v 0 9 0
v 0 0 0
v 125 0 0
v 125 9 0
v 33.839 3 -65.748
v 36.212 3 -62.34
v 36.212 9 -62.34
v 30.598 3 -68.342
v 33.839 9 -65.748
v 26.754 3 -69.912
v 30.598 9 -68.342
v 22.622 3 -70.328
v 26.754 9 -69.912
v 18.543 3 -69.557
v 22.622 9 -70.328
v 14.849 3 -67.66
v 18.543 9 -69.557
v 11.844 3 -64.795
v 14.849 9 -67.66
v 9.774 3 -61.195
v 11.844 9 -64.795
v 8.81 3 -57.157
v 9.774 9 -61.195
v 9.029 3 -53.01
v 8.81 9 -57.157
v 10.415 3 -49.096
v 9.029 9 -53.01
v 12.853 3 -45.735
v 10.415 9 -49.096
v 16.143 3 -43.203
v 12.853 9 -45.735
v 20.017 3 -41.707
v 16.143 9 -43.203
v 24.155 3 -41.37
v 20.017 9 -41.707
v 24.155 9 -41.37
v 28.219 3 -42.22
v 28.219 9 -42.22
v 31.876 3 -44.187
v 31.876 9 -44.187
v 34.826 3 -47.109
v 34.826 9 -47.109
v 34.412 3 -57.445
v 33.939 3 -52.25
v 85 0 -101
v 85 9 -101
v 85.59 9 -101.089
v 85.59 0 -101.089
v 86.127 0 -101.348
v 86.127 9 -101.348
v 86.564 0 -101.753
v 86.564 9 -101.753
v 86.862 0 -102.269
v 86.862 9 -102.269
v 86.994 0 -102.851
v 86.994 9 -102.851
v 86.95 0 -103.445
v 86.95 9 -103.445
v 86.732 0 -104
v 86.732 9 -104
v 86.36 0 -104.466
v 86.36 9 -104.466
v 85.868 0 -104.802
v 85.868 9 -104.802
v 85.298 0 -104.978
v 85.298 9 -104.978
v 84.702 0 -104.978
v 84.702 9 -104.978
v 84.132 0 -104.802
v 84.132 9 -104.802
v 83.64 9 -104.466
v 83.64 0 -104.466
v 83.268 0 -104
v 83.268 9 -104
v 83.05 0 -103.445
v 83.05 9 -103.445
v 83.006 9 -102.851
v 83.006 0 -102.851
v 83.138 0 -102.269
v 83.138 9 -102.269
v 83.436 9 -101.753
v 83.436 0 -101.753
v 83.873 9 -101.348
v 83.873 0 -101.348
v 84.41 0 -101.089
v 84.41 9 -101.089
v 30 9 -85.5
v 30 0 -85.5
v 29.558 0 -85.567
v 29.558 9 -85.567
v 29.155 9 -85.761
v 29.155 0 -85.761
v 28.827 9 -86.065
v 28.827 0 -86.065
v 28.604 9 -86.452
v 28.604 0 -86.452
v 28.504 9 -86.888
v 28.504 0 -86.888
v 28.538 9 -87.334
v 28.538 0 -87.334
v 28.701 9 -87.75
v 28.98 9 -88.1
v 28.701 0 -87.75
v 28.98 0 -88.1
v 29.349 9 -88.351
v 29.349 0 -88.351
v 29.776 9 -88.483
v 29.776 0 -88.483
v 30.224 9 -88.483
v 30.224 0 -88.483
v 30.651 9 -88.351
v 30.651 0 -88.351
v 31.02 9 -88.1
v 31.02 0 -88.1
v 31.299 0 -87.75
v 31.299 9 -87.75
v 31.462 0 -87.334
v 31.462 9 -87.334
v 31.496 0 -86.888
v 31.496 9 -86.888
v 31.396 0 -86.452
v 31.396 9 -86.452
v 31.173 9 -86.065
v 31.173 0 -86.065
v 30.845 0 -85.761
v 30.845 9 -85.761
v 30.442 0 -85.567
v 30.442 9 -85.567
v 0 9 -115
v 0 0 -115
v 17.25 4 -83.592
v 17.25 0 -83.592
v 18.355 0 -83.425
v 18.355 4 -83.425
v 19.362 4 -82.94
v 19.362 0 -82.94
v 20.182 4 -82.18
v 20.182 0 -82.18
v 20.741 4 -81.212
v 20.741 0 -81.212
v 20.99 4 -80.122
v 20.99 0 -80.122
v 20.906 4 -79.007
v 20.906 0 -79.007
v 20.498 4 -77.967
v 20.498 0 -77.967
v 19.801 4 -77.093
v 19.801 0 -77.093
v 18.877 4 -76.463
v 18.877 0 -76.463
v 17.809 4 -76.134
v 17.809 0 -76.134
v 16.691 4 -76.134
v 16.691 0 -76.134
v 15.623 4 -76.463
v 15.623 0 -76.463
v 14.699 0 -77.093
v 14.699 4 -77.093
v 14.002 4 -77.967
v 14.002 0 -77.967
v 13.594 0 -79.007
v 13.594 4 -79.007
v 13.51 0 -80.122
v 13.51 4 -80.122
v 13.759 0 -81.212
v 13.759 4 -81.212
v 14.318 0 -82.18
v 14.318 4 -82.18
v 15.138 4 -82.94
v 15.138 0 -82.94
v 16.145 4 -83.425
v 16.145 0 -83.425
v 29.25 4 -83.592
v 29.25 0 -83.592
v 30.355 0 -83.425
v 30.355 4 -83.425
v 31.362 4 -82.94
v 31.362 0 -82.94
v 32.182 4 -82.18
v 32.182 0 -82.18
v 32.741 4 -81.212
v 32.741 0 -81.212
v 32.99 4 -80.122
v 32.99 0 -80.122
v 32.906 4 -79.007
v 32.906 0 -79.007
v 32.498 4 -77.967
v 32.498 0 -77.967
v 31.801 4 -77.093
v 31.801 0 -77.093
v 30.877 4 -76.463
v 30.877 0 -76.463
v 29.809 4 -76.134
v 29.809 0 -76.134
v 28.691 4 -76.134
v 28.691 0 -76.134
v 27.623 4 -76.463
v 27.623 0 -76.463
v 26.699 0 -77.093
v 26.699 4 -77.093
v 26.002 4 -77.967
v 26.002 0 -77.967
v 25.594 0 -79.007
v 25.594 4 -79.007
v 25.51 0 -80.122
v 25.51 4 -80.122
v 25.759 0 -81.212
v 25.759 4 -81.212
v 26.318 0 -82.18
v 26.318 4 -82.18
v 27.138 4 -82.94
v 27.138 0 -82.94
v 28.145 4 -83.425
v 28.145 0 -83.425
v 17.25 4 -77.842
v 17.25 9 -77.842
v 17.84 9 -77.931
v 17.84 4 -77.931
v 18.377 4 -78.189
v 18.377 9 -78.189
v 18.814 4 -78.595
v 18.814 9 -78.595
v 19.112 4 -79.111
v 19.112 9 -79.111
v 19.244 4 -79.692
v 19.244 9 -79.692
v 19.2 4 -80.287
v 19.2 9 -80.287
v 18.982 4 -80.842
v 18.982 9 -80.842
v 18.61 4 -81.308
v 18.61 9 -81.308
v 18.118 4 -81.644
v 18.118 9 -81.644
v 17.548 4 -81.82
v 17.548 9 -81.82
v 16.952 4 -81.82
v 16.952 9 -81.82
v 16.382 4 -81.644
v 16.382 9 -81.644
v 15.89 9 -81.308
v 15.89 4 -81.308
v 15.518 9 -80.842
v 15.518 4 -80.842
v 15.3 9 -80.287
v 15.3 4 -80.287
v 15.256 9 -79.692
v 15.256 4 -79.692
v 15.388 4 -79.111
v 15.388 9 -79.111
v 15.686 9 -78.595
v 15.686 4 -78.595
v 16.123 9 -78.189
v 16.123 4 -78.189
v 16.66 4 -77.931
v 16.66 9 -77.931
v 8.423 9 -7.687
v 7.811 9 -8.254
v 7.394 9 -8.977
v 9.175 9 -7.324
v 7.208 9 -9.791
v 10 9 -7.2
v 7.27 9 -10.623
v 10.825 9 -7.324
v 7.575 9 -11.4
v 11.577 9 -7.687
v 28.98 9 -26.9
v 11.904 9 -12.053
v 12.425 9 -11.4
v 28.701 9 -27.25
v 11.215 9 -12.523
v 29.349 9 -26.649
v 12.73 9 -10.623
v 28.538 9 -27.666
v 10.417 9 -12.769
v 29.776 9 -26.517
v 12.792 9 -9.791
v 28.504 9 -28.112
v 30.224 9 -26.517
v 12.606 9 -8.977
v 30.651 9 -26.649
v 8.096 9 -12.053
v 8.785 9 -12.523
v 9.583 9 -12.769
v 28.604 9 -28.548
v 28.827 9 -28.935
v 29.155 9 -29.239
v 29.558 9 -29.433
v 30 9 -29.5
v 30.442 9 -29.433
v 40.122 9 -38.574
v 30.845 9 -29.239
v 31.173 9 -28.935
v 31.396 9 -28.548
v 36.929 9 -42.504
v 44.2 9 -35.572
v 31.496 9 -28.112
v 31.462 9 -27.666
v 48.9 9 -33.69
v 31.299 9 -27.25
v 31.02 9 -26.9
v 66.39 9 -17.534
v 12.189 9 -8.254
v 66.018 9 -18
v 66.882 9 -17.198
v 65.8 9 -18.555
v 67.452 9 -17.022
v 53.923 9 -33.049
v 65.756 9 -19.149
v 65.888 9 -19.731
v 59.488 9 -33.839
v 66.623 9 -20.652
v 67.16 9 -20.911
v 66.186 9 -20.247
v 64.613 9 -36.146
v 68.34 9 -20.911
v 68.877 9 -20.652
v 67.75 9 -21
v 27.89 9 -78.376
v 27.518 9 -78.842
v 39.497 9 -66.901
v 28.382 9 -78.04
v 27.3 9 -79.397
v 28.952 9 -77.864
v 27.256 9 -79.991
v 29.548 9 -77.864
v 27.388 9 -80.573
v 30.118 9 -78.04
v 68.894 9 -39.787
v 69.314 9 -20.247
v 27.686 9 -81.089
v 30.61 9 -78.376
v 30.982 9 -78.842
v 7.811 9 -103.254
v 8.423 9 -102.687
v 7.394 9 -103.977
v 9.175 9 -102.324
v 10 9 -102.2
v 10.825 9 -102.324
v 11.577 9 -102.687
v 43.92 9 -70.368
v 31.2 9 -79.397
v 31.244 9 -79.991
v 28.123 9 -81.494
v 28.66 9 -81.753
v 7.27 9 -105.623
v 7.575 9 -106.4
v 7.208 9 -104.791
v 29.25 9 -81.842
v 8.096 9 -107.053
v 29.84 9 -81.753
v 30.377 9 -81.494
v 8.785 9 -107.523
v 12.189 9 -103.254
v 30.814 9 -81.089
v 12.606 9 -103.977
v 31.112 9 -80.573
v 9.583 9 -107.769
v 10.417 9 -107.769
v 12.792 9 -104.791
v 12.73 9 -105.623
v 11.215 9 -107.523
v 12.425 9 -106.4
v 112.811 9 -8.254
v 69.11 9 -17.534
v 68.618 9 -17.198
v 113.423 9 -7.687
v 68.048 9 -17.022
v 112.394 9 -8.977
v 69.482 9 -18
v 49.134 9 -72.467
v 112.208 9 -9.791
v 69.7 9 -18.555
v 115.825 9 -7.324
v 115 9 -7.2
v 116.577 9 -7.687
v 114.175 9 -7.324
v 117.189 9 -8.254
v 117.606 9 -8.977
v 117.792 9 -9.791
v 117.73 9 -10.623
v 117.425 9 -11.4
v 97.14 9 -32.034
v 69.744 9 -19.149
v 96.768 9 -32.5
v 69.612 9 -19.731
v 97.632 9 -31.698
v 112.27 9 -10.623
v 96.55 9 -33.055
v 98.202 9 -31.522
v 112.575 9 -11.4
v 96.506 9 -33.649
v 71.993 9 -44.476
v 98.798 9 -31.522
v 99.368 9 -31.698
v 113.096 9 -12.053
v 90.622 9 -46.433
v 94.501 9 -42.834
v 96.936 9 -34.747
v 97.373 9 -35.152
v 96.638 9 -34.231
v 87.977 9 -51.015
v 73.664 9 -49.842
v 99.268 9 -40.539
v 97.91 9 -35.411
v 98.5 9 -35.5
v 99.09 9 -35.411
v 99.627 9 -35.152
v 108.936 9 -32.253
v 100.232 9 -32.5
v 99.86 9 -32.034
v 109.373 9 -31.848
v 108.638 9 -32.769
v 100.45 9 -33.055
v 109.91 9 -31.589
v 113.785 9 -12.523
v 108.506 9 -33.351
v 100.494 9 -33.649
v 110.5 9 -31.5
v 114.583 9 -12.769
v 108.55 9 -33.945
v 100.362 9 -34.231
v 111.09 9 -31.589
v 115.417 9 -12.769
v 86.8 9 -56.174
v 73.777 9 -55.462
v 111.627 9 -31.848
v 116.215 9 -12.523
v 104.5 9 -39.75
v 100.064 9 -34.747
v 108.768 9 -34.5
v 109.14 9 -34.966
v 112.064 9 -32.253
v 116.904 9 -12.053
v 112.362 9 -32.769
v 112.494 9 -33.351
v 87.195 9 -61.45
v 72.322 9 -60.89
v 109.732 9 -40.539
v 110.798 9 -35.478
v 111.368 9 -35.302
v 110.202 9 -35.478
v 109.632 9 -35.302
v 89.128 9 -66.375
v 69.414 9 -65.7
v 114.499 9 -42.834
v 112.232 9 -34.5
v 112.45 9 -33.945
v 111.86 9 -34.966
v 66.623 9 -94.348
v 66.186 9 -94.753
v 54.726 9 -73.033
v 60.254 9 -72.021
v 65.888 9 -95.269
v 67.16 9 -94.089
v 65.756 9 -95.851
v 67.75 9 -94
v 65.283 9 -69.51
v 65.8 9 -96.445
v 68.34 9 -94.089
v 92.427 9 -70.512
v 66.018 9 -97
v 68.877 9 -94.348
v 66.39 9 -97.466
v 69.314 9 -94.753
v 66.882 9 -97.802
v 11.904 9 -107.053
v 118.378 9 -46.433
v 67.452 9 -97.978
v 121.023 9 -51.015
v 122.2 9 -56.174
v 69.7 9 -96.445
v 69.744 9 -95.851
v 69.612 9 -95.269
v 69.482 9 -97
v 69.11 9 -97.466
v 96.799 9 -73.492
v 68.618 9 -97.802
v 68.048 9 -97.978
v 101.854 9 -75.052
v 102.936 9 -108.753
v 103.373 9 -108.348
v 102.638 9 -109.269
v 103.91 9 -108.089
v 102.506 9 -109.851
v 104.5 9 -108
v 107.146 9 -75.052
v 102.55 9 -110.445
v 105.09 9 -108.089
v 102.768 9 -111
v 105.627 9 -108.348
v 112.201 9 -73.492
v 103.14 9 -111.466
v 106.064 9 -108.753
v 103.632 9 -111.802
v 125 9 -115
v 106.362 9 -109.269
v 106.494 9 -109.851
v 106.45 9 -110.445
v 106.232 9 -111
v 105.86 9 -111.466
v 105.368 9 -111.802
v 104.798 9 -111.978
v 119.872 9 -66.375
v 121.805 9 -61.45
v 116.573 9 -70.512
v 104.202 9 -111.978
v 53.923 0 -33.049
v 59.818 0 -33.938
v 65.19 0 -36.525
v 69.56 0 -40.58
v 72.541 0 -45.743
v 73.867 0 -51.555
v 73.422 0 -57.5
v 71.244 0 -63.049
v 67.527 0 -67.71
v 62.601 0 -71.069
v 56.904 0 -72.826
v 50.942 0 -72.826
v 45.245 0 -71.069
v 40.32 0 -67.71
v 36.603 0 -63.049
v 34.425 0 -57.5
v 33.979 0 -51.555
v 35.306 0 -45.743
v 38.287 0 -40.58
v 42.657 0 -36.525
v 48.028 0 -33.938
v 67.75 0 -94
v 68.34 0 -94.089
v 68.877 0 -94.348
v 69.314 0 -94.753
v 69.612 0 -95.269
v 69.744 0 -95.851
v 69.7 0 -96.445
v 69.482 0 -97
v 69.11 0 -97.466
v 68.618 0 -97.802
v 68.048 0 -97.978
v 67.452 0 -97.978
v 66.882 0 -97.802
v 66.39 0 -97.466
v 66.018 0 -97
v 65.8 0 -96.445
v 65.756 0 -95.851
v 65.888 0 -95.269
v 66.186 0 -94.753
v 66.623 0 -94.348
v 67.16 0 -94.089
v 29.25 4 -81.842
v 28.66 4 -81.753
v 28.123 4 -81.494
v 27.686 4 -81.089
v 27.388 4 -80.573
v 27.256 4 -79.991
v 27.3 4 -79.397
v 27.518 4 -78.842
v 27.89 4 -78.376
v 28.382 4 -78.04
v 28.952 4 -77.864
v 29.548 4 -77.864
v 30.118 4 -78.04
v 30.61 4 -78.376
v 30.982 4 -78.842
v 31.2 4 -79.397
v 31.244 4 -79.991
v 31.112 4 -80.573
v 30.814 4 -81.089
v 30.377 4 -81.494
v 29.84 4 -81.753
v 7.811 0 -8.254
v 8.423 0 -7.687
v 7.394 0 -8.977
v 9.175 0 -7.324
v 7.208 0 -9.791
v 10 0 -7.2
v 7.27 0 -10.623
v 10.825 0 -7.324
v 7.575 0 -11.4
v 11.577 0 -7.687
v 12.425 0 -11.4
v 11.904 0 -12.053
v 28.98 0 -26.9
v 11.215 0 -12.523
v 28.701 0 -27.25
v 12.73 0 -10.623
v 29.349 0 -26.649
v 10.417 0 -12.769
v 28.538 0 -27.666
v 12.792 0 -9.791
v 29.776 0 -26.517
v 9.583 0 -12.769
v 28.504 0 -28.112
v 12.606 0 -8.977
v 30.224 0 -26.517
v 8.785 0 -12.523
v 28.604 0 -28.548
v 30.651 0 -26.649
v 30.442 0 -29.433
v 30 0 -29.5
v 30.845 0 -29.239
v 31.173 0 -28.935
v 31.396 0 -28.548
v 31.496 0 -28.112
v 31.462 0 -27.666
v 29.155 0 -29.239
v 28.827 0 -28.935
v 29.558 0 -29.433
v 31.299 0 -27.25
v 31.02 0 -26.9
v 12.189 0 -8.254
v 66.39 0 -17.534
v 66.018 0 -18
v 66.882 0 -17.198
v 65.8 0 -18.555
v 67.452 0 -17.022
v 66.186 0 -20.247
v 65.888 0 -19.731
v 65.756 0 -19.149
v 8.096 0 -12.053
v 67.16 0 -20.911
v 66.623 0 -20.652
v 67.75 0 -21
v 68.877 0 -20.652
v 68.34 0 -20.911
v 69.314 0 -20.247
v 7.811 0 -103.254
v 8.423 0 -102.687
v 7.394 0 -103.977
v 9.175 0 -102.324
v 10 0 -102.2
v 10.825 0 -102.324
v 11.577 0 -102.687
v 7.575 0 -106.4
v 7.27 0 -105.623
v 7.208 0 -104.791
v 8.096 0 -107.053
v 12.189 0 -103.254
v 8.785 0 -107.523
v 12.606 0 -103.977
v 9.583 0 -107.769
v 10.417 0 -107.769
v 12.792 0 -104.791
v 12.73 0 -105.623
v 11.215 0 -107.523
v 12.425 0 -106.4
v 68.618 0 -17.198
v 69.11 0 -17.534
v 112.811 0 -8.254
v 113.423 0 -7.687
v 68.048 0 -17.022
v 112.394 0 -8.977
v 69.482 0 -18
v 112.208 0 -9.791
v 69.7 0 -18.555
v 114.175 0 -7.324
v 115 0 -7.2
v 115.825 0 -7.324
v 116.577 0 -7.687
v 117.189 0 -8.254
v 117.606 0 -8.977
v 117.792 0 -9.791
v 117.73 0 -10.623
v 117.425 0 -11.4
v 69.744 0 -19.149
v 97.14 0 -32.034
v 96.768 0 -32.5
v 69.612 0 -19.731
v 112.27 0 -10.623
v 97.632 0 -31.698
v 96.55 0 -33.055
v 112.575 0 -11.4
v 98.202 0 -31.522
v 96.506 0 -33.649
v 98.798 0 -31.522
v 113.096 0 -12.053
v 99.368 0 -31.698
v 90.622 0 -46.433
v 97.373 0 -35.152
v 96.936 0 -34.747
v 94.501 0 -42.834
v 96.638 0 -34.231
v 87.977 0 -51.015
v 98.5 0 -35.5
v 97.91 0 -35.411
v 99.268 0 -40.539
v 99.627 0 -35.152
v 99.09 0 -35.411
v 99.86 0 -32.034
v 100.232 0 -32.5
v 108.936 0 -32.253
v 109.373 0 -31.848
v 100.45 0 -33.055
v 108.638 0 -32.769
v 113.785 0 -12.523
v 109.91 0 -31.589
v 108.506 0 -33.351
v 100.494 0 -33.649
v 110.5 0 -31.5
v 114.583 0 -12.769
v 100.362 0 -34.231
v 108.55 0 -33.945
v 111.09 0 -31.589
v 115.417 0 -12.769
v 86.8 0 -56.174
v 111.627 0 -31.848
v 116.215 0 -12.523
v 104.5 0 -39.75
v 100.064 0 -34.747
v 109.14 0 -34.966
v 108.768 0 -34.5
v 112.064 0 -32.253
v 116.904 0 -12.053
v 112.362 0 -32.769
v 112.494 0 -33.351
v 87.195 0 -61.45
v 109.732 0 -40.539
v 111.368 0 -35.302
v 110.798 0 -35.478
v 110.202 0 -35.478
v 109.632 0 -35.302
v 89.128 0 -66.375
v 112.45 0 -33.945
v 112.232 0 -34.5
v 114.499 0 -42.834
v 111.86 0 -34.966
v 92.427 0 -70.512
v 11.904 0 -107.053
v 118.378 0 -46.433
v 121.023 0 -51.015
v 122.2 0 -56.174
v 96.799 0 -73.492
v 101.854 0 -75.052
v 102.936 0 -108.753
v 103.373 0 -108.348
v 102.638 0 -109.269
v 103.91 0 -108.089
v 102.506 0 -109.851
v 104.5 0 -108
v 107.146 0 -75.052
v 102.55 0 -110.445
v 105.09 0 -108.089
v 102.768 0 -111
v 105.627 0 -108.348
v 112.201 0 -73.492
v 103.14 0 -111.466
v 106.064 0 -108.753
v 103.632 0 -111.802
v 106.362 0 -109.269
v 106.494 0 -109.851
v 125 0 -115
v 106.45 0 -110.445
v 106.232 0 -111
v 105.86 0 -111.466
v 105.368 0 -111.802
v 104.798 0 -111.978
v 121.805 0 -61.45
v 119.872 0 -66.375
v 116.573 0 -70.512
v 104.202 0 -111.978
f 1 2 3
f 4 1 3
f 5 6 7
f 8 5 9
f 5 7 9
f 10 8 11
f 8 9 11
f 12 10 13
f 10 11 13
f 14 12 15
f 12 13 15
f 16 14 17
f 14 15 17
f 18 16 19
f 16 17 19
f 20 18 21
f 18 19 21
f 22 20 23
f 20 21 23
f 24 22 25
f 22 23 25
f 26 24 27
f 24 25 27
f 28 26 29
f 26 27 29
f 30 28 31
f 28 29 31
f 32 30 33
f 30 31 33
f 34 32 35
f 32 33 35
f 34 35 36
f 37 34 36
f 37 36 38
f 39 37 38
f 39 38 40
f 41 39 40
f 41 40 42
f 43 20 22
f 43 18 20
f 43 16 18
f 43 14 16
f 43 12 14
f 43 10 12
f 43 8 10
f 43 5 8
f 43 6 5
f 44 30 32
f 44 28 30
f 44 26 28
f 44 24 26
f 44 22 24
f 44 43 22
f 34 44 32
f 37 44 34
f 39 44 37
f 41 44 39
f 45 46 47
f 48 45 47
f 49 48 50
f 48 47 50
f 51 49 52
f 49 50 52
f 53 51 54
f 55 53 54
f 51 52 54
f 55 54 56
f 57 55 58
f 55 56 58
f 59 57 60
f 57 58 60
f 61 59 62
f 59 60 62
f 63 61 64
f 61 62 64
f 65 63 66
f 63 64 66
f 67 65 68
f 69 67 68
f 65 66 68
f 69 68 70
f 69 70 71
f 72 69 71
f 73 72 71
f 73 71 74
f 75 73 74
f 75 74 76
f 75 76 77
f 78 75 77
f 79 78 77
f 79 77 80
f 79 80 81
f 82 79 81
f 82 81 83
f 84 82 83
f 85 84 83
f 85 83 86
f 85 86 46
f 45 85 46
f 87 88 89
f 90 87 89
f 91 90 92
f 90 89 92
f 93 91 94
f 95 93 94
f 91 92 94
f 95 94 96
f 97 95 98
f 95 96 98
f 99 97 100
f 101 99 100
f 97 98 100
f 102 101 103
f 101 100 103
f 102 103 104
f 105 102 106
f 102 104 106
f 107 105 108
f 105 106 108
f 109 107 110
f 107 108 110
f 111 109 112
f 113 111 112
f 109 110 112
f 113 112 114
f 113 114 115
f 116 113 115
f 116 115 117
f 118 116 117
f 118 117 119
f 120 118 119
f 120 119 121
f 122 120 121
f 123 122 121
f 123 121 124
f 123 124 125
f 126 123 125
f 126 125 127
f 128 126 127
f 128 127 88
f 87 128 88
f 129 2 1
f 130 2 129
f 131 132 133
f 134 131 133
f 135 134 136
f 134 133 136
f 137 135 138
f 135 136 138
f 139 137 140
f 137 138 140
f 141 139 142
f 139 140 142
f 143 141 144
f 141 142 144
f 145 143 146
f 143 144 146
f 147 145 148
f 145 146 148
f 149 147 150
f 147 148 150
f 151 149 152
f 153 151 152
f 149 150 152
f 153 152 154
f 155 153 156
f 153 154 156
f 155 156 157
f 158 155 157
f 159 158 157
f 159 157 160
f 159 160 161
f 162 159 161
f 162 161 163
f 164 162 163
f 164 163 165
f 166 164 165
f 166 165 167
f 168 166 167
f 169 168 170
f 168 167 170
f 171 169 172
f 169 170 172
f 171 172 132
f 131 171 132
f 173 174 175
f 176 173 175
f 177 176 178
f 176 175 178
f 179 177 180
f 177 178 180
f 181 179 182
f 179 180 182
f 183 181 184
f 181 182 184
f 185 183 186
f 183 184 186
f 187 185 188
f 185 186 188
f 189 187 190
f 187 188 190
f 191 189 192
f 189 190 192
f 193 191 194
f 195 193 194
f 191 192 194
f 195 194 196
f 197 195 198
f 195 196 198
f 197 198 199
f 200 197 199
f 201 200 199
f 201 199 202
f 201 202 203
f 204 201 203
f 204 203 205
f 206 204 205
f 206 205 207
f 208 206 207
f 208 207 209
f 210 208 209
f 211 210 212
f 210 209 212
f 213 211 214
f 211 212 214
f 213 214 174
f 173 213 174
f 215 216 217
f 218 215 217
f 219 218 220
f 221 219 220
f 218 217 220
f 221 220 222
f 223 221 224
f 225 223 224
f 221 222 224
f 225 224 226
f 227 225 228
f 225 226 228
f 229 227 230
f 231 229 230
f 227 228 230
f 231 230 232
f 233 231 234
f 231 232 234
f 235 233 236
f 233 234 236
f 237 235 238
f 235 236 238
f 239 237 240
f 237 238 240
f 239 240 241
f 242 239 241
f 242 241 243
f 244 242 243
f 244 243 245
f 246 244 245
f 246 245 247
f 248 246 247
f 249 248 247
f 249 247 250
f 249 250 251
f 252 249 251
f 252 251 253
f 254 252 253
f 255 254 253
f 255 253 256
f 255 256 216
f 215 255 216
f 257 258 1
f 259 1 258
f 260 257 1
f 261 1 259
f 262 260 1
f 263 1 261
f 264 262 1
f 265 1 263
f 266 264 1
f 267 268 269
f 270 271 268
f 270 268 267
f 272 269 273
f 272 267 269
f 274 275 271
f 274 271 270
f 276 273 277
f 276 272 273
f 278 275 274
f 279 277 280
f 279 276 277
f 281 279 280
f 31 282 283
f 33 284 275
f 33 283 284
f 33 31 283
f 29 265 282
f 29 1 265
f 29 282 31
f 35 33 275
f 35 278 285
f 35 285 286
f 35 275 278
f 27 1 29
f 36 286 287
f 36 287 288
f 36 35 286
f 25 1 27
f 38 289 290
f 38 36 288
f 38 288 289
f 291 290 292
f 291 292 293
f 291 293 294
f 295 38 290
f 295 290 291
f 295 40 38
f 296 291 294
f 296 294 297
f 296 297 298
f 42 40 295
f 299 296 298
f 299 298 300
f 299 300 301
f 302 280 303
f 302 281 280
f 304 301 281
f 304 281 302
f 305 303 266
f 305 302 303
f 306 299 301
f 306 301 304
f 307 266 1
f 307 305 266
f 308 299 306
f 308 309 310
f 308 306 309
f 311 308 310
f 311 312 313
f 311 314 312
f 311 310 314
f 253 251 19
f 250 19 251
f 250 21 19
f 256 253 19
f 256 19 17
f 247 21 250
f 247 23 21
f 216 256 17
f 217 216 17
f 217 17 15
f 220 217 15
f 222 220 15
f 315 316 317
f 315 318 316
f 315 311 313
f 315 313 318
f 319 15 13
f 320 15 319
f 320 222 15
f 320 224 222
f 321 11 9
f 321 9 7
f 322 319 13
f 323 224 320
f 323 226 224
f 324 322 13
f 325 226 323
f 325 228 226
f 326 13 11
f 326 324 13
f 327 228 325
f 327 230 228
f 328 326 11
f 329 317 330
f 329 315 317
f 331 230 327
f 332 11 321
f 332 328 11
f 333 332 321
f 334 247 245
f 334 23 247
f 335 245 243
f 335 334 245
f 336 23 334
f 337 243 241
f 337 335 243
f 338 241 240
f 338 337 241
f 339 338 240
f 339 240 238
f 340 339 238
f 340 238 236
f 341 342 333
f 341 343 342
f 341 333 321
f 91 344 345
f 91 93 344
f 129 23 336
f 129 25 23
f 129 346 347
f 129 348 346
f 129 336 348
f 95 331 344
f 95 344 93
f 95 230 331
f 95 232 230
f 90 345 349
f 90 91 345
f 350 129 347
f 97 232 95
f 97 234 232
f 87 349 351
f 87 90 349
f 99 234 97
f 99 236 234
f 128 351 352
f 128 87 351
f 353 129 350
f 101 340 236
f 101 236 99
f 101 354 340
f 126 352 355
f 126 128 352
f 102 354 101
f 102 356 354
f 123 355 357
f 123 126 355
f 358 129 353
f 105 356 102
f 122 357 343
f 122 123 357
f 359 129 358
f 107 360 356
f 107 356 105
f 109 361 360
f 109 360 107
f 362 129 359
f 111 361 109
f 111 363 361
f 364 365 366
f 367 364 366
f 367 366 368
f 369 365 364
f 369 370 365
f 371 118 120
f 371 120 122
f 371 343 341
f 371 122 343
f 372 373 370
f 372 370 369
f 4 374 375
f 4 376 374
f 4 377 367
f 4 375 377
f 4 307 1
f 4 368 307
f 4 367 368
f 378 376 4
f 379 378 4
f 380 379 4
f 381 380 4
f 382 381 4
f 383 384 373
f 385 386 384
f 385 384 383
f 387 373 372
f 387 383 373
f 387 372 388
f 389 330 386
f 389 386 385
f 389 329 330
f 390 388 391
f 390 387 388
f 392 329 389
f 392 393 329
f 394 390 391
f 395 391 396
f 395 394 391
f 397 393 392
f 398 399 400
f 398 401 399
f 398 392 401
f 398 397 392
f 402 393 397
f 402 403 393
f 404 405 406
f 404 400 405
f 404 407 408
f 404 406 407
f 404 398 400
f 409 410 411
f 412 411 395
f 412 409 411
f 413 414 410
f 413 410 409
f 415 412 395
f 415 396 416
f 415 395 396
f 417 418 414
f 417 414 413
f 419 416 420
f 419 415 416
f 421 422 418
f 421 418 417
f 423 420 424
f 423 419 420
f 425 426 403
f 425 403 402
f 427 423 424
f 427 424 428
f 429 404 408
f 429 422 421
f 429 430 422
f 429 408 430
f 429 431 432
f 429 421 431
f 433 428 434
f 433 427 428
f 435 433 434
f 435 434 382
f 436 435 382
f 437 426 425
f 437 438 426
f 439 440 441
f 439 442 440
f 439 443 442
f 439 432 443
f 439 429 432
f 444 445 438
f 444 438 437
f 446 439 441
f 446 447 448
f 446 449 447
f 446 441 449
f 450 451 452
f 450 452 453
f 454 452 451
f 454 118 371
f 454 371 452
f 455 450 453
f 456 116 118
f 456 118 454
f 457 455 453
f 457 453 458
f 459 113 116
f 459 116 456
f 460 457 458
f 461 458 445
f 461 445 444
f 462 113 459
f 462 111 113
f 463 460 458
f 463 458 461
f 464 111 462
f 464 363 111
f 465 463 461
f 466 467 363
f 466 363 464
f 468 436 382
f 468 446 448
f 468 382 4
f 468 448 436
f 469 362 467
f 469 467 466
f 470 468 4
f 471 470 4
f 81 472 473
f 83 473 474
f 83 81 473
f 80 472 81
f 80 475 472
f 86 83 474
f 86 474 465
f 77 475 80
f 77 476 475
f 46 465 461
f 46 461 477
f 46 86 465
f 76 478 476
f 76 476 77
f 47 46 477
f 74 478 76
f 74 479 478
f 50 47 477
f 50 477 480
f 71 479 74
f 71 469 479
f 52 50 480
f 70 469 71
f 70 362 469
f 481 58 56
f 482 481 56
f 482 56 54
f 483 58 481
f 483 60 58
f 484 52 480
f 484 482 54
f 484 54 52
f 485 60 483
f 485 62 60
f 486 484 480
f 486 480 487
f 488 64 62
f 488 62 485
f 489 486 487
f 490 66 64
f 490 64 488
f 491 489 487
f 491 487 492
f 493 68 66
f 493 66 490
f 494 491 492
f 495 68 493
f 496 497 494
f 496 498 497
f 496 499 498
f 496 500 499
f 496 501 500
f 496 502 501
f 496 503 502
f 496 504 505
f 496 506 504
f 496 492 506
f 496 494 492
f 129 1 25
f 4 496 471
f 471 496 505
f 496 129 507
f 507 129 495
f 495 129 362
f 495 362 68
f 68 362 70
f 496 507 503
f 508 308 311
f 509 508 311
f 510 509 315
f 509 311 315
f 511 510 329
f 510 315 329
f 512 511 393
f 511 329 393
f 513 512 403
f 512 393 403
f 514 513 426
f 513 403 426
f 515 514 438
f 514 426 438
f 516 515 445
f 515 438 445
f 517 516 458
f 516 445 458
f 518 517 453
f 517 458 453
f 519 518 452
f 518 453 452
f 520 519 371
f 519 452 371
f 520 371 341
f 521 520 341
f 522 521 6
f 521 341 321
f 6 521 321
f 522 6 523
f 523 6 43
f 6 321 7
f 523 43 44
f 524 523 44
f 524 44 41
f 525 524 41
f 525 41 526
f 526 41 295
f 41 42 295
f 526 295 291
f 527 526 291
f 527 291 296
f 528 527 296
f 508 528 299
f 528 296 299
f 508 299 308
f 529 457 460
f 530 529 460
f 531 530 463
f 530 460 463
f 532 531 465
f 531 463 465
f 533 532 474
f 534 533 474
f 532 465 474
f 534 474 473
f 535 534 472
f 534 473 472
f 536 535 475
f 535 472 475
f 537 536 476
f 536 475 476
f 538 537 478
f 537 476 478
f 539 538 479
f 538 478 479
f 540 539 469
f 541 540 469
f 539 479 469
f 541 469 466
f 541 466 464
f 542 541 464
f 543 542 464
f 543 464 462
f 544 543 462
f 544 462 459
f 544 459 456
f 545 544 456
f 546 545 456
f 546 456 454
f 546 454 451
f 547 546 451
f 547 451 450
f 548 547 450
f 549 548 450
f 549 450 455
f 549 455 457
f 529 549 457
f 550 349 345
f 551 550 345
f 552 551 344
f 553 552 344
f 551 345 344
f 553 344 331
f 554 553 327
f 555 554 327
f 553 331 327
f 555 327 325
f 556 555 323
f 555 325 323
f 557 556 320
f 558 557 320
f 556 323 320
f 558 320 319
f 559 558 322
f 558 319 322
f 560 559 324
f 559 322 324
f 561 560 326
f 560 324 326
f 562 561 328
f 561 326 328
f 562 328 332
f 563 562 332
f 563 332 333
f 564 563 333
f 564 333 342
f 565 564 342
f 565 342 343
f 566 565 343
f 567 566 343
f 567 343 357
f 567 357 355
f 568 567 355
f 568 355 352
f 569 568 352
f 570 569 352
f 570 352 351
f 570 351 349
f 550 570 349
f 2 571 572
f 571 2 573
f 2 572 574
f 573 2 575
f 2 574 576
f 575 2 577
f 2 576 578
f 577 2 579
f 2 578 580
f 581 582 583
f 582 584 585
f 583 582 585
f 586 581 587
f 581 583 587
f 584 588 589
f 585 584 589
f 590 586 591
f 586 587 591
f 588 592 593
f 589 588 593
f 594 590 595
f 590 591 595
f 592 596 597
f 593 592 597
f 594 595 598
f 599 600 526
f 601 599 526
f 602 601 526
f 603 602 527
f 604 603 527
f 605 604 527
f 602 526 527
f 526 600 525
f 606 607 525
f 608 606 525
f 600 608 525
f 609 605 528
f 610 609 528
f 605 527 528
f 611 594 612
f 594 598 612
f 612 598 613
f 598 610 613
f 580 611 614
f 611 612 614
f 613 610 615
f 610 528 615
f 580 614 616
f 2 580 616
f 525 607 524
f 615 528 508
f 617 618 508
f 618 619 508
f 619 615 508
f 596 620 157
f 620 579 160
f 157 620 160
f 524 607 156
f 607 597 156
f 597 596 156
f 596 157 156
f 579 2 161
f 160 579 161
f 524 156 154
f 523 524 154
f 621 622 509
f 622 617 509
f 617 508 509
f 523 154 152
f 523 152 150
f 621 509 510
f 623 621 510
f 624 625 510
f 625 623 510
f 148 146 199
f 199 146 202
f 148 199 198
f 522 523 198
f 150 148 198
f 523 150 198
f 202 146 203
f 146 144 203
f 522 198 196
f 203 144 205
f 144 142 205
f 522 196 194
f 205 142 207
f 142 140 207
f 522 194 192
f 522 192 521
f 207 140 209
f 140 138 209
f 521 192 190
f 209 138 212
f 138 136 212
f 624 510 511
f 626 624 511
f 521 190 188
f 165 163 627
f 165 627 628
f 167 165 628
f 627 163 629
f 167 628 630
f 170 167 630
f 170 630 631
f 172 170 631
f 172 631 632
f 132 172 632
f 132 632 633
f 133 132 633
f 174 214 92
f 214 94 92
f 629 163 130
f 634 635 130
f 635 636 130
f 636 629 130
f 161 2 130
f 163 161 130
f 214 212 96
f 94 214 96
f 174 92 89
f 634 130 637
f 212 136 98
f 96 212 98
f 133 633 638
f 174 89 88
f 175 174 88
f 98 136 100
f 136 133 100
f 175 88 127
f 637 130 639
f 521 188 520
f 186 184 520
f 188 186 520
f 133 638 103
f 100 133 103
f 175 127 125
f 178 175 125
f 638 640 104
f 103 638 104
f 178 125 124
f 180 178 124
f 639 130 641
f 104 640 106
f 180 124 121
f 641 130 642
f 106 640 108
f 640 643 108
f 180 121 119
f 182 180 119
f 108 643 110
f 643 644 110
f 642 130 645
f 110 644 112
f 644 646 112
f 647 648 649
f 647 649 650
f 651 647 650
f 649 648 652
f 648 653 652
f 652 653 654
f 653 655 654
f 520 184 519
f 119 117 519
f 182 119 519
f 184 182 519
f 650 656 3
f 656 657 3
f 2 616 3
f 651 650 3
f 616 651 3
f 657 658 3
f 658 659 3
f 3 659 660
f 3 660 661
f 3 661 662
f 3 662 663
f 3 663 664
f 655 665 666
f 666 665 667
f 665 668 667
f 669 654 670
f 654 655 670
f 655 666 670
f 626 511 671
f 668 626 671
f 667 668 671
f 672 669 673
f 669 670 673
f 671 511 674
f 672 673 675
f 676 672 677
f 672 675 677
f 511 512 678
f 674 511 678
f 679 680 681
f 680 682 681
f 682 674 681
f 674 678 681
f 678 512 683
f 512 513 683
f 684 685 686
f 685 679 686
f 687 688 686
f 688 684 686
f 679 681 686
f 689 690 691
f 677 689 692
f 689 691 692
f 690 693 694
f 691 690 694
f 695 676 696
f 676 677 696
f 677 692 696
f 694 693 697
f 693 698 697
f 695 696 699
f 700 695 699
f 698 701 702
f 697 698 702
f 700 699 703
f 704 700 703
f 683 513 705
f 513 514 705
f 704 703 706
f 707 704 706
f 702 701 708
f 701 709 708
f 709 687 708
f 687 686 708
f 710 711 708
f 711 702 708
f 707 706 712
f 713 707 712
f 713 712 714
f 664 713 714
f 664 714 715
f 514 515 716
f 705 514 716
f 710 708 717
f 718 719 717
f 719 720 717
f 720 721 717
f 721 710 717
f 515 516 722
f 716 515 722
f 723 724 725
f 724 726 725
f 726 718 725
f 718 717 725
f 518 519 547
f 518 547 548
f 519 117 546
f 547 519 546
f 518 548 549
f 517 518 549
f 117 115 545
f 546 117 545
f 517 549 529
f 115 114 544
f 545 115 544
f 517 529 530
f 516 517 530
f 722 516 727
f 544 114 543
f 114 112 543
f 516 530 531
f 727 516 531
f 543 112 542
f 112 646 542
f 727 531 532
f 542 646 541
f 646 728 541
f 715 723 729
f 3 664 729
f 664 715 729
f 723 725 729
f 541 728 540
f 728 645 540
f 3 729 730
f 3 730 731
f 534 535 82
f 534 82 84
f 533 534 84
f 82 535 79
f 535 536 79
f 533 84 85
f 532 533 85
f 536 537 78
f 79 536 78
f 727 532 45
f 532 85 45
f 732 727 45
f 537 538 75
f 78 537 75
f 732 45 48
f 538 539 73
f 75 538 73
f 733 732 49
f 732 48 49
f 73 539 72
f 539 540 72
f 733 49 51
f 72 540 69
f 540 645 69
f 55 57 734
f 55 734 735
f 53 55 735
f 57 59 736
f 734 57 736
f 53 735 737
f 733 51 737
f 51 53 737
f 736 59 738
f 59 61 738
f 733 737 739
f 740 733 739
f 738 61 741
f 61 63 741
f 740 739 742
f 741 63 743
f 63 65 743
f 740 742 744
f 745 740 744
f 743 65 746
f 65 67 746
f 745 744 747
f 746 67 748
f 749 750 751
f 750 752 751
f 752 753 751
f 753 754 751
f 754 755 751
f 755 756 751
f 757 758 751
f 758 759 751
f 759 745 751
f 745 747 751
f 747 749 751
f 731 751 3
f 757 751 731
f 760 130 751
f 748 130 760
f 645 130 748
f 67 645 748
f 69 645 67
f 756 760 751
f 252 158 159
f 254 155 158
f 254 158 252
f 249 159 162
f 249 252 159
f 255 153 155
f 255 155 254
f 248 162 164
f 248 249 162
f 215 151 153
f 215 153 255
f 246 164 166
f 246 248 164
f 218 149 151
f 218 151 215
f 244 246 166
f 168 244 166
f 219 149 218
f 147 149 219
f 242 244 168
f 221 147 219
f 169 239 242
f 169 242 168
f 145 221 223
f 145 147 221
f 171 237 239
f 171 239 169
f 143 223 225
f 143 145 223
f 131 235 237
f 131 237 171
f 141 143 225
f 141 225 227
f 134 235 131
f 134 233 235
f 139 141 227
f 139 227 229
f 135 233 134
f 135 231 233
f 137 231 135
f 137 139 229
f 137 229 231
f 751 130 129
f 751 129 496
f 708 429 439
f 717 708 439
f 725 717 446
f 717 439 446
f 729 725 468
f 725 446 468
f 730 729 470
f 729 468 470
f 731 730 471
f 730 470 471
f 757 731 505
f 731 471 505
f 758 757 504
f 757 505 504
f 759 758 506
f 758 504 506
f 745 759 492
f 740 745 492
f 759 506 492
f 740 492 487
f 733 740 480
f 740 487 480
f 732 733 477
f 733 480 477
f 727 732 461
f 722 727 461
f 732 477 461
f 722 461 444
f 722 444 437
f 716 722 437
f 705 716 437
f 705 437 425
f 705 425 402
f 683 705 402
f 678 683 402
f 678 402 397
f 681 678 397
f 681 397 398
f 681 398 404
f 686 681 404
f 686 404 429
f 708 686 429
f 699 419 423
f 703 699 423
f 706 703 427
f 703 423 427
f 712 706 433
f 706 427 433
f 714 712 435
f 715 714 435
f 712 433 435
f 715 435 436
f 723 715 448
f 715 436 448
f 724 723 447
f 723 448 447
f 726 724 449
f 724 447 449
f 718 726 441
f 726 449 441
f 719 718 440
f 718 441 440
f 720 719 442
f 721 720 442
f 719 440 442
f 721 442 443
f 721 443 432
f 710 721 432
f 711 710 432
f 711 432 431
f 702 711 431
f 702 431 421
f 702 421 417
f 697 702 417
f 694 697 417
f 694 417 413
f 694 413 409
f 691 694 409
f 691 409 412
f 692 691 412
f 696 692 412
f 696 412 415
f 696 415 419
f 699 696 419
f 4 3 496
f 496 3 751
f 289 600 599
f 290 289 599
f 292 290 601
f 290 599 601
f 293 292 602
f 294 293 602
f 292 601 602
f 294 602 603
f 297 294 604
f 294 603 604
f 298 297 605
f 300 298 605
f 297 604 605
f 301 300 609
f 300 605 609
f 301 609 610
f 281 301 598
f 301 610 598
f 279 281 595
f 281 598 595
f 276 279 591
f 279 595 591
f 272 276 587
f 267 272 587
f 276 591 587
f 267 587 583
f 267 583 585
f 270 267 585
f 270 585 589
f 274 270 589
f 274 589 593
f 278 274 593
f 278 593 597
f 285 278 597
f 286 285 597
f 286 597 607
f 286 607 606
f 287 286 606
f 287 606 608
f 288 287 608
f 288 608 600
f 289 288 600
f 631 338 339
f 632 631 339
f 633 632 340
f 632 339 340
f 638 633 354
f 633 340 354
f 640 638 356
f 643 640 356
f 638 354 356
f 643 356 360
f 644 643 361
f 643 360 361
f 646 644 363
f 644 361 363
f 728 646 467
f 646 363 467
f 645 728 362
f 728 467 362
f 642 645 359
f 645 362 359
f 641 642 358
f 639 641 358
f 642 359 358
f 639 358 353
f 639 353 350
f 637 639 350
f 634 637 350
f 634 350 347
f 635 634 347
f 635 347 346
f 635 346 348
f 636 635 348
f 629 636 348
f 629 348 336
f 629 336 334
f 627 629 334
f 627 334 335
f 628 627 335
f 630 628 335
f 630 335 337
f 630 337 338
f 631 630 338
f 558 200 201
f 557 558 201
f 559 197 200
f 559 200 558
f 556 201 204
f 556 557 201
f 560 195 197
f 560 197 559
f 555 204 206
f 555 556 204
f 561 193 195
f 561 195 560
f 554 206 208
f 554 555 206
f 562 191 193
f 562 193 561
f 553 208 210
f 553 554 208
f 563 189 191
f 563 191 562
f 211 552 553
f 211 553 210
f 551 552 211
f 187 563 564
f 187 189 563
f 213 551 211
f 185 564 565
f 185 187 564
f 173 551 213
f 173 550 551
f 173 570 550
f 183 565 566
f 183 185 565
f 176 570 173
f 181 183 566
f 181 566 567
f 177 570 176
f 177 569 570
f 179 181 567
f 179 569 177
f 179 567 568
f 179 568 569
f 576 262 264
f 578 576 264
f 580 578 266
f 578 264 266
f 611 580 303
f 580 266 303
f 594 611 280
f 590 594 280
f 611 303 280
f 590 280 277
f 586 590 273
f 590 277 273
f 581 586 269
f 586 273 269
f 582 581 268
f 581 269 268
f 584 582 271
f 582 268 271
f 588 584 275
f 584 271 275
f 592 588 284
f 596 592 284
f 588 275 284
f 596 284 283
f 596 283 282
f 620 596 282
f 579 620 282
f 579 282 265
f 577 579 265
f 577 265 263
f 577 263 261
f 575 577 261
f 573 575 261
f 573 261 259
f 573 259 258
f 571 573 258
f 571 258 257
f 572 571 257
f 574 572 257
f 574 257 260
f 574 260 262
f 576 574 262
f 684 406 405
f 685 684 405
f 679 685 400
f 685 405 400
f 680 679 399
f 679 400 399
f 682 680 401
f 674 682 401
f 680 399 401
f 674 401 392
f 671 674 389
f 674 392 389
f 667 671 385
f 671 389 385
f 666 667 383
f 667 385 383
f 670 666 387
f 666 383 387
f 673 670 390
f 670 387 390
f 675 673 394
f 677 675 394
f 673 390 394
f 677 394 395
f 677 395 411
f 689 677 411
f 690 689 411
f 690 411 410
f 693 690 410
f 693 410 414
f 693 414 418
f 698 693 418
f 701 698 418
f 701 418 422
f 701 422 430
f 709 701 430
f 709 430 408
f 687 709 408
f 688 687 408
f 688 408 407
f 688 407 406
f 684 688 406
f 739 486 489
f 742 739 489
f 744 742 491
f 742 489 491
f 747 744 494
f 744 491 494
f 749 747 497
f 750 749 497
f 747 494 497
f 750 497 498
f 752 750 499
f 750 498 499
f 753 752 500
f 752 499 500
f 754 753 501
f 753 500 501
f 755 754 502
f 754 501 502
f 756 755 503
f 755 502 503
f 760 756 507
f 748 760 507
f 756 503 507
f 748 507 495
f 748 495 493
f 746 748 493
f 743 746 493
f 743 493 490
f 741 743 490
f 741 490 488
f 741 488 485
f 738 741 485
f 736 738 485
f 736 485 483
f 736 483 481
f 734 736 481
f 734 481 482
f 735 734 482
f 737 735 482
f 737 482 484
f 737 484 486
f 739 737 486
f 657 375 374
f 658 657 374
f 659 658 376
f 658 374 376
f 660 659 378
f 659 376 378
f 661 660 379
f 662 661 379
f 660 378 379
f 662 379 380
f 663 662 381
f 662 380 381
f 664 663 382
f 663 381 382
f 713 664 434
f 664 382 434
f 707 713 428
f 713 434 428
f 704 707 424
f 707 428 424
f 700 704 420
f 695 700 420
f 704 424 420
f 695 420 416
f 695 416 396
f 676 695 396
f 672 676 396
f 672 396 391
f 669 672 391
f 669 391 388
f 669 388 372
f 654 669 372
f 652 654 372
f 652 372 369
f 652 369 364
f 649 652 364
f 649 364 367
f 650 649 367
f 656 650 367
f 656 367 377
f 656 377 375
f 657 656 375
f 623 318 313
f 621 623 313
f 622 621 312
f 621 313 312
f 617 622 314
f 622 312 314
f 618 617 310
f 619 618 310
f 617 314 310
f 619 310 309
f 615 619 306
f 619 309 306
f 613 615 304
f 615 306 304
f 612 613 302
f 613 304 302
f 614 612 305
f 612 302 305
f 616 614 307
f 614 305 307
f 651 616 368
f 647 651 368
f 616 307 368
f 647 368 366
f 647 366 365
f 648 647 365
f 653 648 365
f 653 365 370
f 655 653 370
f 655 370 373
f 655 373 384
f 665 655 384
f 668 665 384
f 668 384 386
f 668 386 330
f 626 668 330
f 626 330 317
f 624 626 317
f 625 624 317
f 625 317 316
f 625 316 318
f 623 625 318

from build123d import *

# Parameters (mm, degrees)
SKETCH1_W                            = 125
SKETCH1_H                            = 115
TOP_BASE_DEPTH                       = 9
SKETCH5_R                            = 14.5
DRIVE_GEAR_EXTRUDE_CUT_DEPTH         = 6
SKETCH17_R                           = 20
INTERMEDIATE_GEAR_TOP_PART_CUT_DEPTH = 171.091152033
SKETCH8_R                            = 17.75
THUMB_EXTRUDE_CUT_DEPTH              = 171.091152033
SKETCH26_R                           = 1.5
STRING_HOLES_DEPTH                   = 171.091152033
THUMB_MOUNT_HOLES_R                  = 2
THUMB_MOUNT_HOLES_M4_DEPTH           = 171.091152033
FINGERS_MOUNT_HOLES_R                = 2
FINGERS_MOUNT_HOLES_M4_DEPTH         = 171.091152033
CONNECT_HOLES_POSITION_R             = 2.8
CONNECT_HOLES_M6_DEPTH               = 171.091152033
SKETCH27_R                           = 3.75
XL320_NUT_M4_DEPTH                   = 4


with BuildPart() as part:
    # Sketch1 → Top_Base (new body)
    with BuildSketch(Plane(origin=(0, 0, 0), x_dir=(1, 0, 0), z_dir=(0, 1, 0))):
        with Locations((62.5, 57.5)):
            Rectangle(SKETCH1_W, SKETCH1_H)
    extrude(amount=TOP_BASE_DEPTH)

    # Sketch5 → Drive_Gear_Extrude_Cut (cut)
    with BuildSketch(Plane(origin=(0, 9, 0), x_dir=(1, 0, 0), z_dir=(0, 1, 0))):
        with Locations(Location((23.25, 55.841914565, 0), (0, 0, 270))):
            Circle(SKETCH5_R)
    extrude(amount=-DRIVE_GEAR_EXTRUDE_CUT_DEPTH, mode=Mode.SUBTRACT)

    # Sketch17 → Intermediate_Gear_Top_Part_Cut (cut, through all)
    with BuildSketch(Plane(origin=(0, 9, 0), x_dir=(1, 0, 0), z_dir=(0, 1, 0))):
        with Locations(Location((53.923140352, 53.049342105, 0), (0, 0, 270))):
            Circle(SKETCH17_R)
    extrude(amount=-INTERMEDIATE_GEAR_TOP_PART_CUT_DEPTH, mode=Mode.SUBTRACT)

    # Sketch8 → Thumb_Extrude_Cut (cut, through all)
    with BuildSketch(Plane(origin=(0, 9, 0), x_dir=(1, 0, 0), z_dir=(0, 1, 0))):
        with Locations(Location((104.5, 57.5, 0), (0, 0, 270))):
            Circle(SKETCH8_R)
    extrude(amount=-THUMB_EXTRUDE_CUT_DEPTH, mode=Mode.SUBTRACT)

    # Sketch26 → String_Holes (cut, through all)
    with BuildSketch(Plane.XZ):
        with Locations(Location((30, -28, 0), (0, 0, 270))):
            Circle(SKETCH26_R)
        with Locations(Location((30, -87, 0), (0, 0, 90))):
            Circle(SKETCH26_R)
    extrude(amount=-STRING_HOLES_DEPTH, mode=Mode.SUBTRACT)

    # Thumb_Mount_Holes → Thumb_Mount_Holes_(M4) (cut, through all)
    with BuildSketch(Plane(origin=(0, 9, 0), x_dir=(1, 0, 0), z_dir=(0, 1, 0))):
        with Locations(Location((104.5, 110, 0), (0, 0, 270))):
            Circle(THUMB_MOUNT_HOLES_R)
        with Locations(Location((85, 103, 0), (0, 0, 270))):
            Circle(THUMB_MOUNT_HOLES_R)
        with Locations(Location((110.5, 33.5, 0), (0, 0, 270))):
            Circle(THUMB_MOUNT_HOLES_R)
        with Locations(Location((98.5, 33.5, 0), (0, 0, 90))):
            Circle(THUMB_MOUNT_HOLES_R)
    extrude(amount=-THUMB_MOUNT_HOLES_M4_DEPTH, mode=Mode.SUBTRACT)

    # Fingers_Mount_Holes → Fingers_Mount_Holes_(M4) (cut, through all)
    with BuildSketch(Plane(origin=(0, 9, 0), x_dir=(1, 0, 0), z_dir=(0, 1, 0))):
        with Locations(Location((67.75, 96, 0), (0, 0, 270))):
            Circle(FINGERS_MOUNT_HOLES_R)
        with Locations(Location((67.75, 19, 0), (0, 0, 90))):
            Circle(FINGERS_MOUNT_HOLES_R)
        with Locations(Location((17.25, 79.841914565, 0), (0, 0, 270))):
            Circle(FINGERS_MOUNT_HOLES_R)
        with Locations(Location((29.25, 79.841914565, 0), (0, 0, 90))):
            Circle(FINGERS_MOUNT_HOLES_R)
    extrude(amount=-FINGERS_MOUNT_HOLES_M4_DEPTH, mode=Mode.SUBTRACT)

    # Connect_Holes_Position → Connect_Holes_(M6) (cut, through all)
    with BuildSketch(Plane(origin=(0, 9, 0), x_dir=(1, 0, 0), z_dir=(0, 1, 0))):
        with Locations(Location((10, 105, 0), (0, 0, 270))):
            Circle(CONNECT_HOLES_POSITION_R)
        with Locations(Location((115, 10, 0), (0, 0, 270))):
            Circle(CONNECT_HOLES_POSITION_R)
        with Locations(Location((10, 10, 0), (0, 0, 270))):
            Circle(CONNECT_HOLES_POSITION_R)
    extrude(amount=-CONNECT_HOLES_M6_DEPTH, mode=Mode.SUBTRACT)

    # Sketch27 → XL320_Nut_(M4) (cut)
    with BuildSketch(Plane.XZ):
        with Locations(Location((29.25, -79.841914565, 0), (0, 0, 270))):
            Circle(SKETCH27_R)
        with Locations(Location((17.25, -79.841914565, 0), (0, 0, 270))):
            Circle(SKETCH27_R)
    extrude(amount=-XL320_NUT_M4_DEPTH, mode=Mode.SUBTRACT)


solid = part.part
